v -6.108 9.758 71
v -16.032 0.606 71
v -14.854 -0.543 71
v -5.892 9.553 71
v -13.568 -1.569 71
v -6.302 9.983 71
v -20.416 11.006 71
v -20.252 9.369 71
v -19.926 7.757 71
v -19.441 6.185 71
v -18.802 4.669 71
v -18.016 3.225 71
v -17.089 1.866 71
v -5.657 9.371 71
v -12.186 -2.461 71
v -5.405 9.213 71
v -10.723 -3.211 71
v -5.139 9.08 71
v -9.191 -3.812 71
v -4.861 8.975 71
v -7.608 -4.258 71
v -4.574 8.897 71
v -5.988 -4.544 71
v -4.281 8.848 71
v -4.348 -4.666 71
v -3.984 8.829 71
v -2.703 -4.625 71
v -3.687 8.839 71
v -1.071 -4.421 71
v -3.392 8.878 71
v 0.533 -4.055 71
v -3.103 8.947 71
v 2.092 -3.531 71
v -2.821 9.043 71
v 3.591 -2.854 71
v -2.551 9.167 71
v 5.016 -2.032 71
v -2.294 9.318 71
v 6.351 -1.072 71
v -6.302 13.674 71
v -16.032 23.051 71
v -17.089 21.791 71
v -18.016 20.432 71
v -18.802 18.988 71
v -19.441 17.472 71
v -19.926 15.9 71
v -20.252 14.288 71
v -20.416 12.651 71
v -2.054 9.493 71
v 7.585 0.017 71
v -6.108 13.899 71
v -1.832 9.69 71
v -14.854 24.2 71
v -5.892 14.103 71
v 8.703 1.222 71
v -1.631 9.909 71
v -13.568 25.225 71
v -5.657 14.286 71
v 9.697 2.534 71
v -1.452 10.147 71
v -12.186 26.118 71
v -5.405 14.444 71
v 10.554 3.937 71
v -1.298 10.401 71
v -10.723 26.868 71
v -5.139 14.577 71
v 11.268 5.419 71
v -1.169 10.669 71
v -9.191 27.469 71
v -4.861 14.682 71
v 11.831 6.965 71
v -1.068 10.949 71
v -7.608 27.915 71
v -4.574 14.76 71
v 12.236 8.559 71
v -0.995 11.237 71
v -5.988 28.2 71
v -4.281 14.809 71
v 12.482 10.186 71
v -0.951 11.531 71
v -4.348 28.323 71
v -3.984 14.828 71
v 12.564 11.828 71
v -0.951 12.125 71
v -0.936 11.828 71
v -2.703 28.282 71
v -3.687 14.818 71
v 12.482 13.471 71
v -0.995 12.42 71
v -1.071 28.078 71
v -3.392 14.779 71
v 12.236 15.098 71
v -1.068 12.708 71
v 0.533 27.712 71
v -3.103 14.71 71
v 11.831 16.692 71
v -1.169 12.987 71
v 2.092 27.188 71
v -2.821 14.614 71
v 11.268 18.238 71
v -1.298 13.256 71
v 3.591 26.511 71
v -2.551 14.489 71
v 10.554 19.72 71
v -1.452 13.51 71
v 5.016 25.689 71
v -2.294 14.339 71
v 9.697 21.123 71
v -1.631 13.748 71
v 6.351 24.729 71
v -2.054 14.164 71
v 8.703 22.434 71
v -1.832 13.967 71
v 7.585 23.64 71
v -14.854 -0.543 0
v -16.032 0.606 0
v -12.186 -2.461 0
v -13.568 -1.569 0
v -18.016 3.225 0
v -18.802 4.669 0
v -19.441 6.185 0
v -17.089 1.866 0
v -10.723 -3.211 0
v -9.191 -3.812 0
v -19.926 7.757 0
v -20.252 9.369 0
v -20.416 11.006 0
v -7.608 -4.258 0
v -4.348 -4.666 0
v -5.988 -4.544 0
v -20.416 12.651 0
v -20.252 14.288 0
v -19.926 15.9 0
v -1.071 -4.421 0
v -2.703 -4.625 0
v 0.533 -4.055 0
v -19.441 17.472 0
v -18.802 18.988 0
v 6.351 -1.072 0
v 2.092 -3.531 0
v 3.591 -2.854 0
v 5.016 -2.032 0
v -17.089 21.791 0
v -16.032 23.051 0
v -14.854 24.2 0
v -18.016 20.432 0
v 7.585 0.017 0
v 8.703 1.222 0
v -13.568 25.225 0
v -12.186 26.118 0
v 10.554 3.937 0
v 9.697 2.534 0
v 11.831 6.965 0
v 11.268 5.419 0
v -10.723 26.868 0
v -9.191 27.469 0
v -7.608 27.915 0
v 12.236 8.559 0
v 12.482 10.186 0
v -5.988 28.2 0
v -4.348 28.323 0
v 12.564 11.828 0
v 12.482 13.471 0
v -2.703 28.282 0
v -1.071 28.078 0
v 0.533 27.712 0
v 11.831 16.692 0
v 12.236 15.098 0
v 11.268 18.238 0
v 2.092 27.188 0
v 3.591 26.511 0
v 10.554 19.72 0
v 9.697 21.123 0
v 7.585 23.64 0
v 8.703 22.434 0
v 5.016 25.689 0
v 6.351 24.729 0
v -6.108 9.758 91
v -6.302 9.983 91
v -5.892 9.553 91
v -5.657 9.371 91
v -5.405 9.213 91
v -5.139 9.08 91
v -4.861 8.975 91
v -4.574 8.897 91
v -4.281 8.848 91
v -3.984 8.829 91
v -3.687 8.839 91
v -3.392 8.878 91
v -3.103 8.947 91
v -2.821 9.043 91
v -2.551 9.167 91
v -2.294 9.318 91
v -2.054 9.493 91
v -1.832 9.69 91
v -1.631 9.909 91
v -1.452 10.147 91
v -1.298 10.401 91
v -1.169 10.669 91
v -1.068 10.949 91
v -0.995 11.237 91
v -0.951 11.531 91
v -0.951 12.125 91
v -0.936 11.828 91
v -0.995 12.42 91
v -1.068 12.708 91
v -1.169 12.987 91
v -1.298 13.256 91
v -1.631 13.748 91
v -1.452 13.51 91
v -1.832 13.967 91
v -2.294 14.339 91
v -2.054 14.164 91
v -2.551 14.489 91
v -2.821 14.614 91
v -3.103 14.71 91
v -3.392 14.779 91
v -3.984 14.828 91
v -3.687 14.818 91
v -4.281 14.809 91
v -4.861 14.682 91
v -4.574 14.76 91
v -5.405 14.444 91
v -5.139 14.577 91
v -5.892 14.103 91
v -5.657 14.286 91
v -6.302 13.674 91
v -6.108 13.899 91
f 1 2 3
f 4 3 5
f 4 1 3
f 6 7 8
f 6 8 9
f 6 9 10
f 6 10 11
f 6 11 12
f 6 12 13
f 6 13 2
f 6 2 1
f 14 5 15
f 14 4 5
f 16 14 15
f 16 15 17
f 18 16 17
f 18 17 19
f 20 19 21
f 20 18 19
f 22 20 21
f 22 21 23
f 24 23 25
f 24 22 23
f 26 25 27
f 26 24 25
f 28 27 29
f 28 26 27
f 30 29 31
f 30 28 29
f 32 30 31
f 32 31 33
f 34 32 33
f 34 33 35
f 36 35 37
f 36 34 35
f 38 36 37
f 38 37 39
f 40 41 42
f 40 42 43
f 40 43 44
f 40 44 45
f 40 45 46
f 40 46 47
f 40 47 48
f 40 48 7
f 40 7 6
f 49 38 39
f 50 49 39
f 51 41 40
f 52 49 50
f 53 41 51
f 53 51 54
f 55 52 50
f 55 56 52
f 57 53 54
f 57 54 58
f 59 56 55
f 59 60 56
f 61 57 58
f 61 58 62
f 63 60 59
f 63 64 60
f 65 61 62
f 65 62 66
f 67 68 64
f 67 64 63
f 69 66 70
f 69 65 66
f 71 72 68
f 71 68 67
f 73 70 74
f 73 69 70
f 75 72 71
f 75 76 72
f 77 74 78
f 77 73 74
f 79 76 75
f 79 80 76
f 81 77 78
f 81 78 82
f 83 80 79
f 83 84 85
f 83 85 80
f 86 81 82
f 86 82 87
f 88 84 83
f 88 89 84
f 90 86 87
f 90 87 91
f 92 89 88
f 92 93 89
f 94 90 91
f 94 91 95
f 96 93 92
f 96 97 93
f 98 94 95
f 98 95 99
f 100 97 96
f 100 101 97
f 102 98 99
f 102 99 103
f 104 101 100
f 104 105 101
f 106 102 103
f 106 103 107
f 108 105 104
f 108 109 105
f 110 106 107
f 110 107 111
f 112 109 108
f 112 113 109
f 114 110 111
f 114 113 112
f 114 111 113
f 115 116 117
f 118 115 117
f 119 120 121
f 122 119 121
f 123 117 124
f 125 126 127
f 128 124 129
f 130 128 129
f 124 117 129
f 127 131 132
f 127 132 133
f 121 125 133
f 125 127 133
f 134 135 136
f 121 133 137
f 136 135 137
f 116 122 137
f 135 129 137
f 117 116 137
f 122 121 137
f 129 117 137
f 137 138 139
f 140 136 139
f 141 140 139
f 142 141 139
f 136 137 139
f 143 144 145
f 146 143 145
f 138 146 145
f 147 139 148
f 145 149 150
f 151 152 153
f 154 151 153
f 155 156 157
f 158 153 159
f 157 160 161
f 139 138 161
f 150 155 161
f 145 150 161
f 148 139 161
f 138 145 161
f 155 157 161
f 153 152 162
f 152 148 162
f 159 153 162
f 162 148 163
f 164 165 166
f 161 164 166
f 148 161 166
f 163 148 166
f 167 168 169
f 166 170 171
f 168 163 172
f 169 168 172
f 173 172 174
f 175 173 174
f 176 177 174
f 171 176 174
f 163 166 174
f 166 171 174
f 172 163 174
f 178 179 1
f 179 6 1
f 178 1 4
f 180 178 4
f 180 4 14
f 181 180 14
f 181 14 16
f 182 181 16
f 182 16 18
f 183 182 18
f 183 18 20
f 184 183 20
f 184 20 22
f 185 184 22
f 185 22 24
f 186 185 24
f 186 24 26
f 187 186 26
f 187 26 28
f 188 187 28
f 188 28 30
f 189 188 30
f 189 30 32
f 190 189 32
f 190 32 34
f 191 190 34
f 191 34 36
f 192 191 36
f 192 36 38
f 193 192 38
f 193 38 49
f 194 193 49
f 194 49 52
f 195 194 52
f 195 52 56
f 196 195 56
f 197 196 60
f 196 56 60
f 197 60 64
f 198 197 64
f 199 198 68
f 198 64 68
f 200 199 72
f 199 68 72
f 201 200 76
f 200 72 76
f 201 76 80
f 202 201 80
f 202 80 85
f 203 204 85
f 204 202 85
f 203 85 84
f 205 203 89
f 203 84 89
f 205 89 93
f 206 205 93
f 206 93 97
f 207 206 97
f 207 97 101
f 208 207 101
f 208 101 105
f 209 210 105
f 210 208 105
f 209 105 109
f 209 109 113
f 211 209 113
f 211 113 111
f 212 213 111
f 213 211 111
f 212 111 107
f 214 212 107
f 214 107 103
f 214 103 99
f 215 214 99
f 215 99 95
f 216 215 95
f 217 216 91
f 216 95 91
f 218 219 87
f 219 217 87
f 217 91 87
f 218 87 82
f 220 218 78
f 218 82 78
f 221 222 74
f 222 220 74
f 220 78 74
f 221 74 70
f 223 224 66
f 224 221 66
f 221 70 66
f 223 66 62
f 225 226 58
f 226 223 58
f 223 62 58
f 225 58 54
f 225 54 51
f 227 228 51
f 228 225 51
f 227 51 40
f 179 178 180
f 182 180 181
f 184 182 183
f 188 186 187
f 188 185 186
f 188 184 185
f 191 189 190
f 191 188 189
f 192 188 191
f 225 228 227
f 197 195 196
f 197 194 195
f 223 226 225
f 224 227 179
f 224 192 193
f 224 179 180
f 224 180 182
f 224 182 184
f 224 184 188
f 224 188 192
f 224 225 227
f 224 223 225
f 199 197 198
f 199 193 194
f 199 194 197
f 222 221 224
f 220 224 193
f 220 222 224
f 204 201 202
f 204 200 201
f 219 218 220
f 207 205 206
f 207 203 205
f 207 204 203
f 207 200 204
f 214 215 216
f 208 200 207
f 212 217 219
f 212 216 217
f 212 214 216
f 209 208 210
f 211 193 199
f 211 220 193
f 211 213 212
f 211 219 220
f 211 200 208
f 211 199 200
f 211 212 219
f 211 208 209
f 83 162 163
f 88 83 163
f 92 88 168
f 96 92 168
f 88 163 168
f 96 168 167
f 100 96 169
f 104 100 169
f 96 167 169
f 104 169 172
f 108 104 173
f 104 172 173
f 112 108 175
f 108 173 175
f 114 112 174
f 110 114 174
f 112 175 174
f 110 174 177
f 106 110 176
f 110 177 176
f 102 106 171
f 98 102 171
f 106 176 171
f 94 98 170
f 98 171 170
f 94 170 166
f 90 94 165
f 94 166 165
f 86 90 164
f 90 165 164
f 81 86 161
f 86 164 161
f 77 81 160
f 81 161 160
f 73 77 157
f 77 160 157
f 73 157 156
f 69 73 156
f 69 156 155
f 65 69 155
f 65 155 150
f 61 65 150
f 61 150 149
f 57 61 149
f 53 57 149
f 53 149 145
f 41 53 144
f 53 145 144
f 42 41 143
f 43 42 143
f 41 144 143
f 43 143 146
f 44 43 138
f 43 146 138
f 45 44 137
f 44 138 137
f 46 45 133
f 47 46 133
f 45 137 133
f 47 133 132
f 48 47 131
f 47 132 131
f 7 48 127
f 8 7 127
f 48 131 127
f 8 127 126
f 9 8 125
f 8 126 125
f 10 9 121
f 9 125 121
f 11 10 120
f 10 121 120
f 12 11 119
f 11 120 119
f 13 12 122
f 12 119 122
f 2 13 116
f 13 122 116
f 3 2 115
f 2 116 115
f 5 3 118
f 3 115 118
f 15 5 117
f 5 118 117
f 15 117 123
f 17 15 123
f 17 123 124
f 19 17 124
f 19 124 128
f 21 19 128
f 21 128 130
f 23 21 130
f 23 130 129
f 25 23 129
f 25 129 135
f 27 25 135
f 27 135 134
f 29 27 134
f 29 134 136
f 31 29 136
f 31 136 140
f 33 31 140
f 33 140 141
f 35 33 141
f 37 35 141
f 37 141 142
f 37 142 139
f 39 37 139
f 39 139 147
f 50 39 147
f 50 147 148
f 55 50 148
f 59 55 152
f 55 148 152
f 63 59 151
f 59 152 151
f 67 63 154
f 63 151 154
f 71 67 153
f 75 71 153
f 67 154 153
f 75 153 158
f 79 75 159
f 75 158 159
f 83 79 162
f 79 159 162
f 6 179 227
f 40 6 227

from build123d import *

# Parameters (mm, degrees)
ESQUISSE1_R             = 16.5
BOSS_EXTRU_1_DEPTH      = 71
ESQUISSE2_R             = 3
BOSS_EXTRU_2_DEPTH      = 20
ESQUISSE3_W             = 2.683906319
ESQUISSE3_H             = 8.065697874
ENL_V_MAT_EXTRU_1_DEPTH = 23


with BuildPart() as part:
    # Esquisse1 → Boss.-Extru.1 (new body)
    with BuildSketch(Plane.XY):
        with Locations((-3.936360625, 11.828431373)):
            Circle(ESQUISSE1_R)
    extrude(amount=BOSS_EXTRU_1_DEPTH)

    # Esquisse2 → Boss.-Extru.2 (add)
    with BuildSketch(Plane.XY.offset(71)):
        with Locations((-3.936360625, 11.828431373)):
            Circle(ESQUISSE2_R)
    extrude(amount=BOSS_EXTRU_2_DEPTH)

    # Esquisse3 → Enlèv. mat.-Extru.1 (cut)
    with BuildSketch(Plane.XY.offset(71)):
        with Locations((-7.643790541, 11.335031517)):
            Rectangle(ESQUISSE3_W, ESQUISSE3_H)
    extrude(amount=ENL_V_MAT_EXTRU_1_DEPTH, mode=Mode.SUBTRACT)


solid = part.part
